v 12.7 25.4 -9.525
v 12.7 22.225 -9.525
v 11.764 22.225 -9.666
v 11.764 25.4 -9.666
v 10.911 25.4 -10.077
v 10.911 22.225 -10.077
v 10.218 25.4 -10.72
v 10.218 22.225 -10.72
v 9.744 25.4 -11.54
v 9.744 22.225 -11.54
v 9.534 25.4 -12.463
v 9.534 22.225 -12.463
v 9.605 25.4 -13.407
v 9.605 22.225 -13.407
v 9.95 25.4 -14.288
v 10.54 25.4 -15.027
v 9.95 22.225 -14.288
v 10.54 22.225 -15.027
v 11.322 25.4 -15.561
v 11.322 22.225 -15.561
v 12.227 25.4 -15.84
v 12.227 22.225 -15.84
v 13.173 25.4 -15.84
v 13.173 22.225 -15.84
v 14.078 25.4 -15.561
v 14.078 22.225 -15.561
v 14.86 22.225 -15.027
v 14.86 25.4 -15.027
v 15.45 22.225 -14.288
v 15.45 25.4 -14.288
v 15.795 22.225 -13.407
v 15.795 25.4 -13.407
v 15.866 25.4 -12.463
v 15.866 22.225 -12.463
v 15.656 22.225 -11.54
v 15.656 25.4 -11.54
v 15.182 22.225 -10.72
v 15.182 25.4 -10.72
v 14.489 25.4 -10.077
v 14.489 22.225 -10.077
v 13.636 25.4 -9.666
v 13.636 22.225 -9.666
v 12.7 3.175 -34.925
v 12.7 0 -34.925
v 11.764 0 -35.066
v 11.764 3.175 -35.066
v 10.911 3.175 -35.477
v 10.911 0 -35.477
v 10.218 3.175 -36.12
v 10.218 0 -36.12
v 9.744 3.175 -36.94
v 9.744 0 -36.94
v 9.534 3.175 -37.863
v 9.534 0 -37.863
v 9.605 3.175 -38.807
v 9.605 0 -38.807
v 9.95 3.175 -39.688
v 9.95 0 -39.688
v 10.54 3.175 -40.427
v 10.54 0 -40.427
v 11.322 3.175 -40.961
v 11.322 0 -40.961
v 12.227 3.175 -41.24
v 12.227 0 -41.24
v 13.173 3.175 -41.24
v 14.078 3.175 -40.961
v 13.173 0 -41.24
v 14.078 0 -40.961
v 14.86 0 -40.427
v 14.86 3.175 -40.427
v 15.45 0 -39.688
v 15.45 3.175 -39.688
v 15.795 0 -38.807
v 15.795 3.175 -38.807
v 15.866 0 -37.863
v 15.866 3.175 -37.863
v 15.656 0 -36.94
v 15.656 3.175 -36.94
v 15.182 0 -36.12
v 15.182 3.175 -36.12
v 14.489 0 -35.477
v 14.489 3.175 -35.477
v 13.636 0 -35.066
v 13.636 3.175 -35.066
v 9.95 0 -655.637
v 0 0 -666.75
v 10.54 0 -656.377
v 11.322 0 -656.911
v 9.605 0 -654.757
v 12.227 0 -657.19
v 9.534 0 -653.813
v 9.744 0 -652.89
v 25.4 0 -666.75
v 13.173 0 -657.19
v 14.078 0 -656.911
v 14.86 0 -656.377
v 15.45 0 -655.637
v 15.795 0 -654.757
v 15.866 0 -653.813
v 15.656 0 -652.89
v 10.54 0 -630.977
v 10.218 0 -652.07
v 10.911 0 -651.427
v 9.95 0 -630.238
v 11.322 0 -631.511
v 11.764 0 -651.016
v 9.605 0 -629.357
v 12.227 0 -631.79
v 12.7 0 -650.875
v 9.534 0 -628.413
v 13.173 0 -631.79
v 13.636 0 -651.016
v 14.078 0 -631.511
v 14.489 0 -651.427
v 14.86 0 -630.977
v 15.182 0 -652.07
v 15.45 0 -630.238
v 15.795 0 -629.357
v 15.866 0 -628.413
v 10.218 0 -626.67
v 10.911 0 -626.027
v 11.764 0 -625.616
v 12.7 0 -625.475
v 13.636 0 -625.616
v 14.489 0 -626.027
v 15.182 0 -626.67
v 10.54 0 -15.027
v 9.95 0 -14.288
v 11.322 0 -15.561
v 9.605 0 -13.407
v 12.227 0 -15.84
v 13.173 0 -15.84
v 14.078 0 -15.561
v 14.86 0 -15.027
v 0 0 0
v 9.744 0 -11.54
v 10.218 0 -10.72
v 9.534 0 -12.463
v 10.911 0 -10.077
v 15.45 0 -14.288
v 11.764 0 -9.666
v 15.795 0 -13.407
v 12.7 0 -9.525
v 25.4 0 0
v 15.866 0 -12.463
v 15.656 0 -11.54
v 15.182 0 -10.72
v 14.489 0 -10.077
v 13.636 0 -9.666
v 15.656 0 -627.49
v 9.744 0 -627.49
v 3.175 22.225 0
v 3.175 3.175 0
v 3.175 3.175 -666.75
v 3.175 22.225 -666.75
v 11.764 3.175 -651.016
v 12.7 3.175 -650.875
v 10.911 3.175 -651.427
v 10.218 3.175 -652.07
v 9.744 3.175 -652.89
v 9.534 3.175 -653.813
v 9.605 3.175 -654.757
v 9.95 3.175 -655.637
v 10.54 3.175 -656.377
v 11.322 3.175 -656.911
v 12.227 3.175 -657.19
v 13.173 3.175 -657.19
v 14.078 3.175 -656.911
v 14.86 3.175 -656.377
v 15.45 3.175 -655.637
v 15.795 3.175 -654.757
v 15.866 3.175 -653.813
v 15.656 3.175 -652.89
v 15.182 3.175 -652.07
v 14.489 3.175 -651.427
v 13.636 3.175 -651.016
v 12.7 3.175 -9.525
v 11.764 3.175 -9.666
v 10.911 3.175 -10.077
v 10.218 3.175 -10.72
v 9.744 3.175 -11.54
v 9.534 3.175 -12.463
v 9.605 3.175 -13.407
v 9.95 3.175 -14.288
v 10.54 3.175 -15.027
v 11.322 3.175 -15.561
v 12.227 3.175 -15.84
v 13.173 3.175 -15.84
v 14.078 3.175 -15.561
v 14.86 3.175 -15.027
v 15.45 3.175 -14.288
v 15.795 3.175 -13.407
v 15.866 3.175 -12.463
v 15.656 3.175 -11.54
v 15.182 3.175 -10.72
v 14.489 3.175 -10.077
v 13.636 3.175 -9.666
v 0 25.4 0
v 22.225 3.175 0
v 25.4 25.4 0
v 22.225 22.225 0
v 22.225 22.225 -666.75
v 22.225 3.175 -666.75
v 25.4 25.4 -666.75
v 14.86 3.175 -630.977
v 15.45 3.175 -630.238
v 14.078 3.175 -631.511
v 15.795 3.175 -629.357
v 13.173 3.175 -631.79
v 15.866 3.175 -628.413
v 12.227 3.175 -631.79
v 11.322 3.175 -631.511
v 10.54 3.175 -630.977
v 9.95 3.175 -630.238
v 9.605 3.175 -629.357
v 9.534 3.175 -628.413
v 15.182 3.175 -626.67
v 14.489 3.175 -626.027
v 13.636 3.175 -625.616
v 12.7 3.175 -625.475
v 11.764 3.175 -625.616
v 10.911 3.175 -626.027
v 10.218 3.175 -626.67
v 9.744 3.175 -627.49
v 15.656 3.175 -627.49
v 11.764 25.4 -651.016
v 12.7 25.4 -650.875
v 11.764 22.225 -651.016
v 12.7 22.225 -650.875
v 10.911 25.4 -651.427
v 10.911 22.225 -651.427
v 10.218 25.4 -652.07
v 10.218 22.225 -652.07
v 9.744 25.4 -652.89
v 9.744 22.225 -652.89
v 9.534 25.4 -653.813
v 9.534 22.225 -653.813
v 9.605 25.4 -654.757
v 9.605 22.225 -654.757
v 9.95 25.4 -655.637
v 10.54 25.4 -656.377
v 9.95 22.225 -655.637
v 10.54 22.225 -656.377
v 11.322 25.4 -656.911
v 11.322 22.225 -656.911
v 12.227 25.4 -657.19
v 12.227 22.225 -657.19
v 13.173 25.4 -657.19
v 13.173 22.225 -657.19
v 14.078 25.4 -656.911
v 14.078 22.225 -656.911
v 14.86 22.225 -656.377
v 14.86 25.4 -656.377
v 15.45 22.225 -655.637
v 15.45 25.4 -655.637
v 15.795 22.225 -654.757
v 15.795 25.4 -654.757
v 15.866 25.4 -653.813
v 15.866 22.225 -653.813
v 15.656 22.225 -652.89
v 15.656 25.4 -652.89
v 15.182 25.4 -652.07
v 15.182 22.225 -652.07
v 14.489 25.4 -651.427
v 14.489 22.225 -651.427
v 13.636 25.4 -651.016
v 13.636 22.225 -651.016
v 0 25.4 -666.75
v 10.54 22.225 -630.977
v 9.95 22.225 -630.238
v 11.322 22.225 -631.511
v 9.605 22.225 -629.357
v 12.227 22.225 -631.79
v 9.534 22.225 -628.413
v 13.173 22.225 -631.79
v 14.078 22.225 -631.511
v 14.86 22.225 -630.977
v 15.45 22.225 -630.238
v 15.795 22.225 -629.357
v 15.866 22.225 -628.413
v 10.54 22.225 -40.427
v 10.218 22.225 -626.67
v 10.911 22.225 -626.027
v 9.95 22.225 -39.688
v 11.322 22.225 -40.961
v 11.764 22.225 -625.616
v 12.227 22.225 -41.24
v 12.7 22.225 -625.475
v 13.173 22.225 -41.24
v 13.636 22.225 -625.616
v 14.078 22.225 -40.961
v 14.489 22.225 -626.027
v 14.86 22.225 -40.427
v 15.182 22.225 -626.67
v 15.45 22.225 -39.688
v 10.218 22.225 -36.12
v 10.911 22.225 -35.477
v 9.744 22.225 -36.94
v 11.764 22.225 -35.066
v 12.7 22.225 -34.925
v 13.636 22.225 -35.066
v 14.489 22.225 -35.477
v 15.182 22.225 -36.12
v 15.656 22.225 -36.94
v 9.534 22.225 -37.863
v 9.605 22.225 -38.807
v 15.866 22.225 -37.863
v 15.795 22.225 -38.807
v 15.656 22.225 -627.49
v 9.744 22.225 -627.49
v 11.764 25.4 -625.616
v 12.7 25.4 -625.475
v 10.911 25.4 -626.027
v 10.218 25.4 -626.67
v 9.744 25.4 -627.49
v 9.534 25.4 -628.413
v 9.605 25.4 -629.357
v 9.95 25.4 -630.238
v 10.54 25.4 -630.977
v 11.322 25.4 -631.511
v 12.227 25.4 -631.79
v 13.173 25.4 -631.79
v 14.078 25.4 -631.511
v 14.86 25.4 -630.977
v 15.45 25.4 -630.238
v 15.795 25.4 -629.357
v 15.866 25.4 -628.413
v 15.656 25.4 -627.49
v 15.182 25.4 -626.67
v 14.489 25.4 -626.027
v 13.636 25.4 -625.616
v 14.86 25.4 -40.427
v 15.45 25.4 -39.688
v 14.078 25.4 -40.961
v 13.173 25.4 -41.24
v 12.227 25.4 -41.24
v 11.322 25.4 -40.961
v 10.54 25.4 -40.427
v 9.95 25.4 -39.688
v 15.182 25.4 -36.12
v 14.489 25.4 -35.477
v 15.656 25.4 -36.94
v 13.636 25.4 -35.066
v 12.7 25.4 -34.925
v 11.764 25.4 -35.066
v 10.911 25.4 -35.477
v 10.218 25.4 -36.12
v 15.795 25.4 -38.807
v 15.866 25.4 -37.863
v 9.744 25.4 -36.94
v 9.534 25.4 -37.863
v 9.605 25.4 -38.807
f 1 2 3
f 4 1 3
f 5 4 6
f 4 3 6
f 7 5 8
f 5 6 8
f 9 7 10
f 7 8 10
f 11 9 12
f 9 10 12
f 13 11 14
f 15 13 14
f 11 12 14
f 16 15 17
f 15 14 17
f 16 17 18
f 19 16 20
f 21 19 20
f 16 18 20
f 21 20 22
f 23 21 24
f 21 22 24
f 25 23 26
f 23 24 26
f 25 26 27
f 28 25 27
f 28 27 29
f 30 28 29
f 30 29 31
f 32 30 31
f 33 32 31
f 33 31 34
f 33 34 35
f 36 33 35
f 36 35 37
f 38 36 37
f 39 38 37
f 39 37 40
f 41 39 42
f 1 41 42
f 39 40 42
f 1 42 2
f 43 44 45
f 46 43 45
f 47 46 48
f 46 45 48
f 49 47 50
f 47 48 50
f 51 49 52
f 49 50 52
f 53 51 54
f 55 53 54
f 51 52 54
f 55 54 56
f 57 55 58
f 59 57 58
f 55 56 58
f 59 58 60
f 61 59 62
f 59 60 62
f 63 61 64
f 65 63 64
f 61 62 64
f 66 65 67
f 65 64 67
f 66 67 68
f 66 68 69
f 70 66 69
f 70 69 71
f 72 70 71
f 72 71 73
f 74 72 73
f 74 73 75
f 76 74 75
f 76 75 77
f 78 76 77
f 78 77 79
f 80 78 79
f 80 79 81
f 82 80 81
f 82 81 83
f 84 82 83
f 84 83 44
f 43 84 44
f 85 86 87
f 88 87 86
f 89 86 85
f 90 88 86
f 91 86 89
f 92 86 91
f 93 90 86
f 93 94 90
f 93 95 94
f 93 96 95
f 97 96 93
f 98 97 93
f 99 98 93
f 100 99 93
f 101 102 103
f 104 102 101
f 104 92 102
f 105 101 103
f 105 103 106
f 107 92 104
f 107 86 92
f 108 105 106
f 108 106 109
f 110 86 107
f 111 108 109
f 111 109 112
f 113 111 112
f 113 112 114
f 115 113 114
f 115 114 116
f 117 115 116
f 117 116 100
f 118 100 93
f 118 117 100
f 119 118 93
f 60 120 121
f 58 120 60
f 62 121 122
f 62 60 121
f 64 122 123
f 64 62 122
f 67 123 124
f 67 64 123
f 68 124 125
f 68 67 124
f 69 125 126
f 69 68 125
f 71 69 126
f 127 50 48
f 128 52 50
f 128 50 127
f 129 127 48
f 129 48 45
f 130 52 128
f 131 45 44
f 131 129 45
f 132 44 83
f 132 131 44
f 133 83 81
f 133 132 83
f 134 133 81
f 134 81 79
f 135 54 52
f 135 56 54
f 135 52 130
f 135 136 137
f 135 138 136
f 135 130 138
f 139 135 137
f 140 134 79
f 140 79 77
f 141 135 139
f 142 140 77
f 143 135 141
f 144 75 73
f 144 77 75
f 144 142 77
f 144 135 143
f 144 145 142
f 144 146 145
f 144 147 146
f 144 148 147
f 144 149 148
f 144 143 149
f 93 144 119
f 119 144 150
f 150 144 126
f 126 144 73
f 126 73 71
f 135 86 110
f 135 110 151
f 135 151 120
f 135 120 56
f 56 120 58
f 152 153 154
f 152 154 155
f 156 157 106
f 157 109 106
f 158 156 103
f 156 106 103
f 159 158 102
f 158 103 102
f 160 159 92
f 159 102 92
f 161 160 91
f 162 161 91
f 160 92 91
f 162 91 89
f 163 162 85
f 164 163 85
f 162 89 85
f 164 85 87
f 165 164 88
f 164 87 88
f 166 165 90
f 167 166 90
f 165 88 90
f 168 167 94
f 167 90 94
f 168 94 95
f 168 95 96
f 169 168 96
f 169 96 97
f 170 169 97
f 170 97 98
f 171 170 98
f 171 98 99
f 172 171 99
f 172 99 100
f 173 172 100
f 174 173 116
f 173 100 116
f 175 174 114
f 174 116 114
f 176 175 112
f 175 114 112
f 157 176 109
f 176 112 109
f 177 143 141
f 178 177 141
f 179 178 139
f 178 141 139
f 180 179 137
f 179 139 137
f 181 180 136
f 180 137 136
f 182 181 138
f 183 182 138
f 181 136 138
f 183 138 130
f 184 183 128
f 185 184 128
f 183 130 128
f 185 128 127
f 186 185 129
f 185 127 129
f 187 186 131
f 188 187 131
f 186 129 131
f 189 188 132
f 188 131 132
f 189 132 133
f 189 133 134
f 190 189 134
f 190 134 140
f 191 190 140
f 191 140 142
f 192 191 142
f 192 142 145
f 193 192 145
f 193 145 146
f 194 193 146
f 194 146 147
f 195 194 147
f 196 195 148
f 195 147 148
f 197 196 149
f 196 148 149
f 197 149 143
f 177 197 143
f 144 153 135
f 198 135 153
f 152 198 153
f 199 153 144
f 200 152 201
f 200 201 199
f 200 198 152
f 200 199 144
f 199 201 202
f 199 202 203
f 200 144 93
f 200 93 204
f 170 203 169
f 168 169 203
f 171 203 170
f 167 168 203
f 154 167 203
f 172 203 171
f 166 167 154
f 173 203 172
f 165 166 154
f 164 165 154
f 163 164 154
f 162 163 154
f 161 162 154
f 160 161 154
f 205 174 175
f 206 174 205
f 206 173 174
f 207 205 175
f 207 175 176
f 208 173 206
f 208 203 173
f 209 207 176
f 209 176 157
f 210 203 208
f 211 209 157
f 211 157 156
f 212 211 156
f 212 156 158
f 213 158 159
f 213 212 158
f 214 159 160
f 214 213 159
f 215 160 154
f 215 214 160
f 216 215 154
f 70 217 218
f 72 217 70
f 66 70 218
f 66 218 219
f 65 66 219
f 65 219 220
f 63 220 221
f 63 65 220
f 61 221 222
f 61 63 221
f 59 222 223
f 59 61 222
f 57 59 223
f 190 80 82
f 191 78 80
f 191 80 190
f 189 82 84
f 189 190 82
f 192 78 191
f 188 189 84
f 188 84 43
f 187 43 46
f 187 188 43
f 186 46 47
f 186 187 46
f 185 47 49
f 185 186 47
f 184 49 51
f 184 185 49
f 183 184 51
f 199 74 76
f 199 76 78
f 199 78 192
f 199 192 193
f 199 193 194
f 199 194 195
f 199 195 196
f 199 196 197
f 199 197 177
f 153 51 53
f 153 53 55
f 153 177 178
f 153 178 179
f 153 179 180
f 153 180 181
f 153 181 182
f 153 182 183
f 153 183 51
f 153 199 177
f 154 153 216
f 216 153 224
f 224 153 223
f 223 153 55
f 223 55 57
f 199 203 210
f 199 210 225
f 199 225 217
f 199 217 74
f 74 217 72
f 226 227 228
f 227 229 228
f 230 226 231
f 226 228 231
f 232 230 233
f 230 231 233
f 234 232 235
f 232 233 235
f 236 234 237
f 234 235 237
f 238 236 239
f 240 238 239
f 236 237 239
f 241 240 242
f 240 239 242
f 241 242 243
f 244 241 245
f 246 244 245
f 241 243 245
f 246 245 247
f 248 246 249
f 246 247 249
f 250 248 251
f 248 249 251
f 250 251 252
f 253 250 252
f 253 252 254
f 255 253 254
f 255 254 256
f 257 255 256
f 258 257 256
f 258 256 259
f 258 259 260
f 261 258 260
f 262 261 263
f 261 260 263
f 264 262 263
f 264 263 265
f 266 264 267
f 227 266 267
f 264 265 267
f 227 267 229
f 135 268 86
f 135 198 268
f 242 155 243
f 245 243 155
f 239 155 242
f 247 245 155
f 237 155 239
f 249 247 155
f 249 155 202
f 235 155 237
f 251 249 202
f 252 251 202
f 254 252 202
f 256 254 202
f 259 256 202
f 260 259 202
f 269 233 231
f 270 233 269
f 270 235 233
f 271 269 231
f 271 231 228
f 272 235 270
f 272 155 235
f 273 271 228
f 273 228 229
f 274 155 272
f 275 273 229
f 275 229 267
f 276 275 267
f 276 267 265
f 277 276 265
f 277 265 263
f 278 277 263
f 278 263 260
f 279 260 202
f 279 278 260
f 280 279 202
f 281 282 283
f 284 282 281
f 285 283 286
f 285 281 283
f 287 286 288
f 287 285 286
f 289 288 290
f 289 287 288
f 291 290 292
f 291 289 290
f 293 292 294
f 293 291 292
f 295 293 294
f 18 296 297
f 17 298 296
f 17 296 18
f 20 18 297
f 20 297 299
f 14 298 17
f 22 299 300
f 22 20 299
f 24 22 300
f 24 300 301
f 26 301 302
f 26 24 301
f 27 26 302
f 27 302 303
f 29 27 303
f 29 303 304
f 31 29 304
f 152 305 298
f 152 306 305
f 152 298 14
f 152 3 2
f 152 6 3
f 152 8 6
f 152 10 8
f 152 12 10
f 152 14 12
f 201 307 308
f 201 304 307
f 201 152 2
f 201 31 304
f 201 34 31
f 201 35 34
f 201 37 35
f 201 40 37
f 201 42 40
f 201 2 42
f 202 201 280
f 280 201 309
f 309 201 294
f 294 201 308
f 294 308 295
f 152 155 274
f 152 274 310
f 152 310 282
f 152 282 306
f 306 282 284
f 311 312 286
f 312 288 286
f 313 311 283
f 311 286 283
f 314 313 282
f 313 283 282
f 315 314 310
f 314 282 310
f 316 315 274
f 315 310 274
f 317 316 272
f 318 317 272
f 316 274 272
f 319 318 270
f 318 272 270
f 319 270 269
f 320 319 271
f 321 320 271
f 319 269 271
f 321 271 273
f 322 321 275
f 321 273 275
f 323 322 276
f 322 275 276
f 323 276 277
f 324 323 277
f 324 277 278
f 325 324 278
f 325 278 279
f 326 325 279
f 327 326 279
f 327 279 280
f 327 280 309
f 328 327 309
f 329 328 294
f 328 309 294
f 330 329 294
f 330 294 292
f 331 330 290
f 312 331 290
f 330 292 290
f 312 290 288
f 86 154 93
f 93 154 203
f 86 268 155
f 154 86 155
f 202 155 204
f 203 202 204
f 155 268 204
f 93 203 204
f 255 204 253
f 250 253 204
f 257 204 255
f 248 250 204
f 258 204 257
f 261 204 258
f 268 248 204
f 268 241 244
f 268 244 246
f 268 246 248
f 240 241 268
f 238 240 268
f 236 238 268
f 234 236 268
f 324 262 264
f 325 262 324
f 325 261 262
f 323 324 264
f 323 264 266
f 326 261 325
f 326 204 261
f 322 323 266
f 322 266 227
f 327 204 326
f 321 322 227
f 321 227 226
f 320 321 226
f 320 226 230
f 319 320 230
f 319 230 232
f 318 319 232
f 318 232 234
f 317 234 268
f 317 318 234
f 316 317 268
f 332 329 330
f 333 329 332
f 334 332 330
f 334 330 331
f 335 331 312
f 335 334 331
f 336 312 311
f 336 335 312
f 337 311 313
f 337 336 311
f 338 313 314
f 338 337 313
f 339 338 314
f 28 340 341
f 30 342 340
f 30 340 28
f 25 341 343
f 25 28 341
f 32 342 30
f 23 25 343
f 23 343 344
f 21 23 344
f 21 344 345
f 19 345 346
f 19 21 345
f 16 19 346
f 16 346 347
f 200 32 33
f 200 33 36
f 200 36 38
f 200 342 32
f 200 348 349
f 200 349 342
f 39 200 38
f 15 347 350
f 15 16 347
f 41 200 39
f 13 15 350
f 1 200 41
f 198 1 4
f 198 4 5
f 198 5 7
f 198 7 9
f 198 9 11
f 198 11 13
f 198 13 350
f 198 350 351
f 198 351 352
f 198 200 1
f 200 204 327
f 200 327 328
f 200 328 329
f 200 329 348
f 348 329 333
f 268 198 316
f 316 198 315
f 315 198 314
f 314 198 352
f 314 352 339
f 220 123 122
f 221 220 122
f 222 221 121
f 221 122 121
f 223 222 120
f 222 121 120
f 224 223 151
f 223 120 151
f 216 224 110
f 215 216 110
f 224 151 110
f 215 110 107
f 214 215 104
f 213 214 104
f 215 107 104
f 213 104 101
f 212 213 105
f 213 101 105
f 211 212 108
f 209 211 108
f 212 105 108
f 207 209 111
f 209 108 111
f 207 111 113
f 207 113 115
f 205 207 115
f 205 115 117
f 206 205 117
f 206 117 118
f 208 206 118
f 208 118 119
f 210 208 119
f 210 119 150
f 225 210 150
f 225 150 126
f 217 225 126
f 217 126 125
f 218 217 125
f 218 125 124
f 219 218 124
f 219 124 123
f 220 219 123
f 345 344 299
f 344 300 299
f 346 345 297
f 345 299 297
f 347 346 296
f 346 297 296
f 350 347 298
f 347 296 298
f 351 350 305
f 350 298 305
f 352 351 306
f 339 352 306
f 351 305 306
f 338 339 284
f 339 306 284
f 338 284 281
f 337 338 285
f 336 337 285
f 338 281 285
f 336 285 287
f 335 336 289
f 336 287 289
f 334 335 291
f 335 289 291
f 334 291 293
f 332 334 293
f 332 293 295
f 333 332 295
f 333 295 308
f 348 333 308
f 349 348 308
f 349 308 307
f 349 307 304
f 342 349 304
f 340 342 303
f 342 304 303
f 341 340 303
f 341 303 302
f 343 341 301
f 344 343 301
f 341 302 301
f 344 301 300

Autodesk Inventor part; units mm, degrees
ref_plane "YZ Plane" through (0, 0, 0) normal (1, 0, 0) x (0, 1, 0)
ref_plane "XZ Plane" through (0, 0, 0) normal (0, 1, 0) x (-1, 0, 0)
ref_plane "XY Plane" through (0, 0, 0) normal (0, 0, 1) x (1, 0, 0)
sketch "Sketch1" plane through (0, 0, 0) normal (0, 0, 1) x (1, 0, 0)
  line L0 (0, 0) -> (25.4, 0)
  line L1 (25.4, 0) -> (25.4, 25.4)
  line L2 (25.4, 25.4) -> (0, 25.4)
  line L3 (0, 25.4) -> (0, 0)
  line L4 (3.175, 22.225) -> (22.225, 22.225)
  line L5 (22.225, 22.225) -> (22.225, 3.175)
  line L6 (22.225, 3.175) -> (3.175, 3.175)
  line L7 (3.175, 3.175) -> (3.175, 22.225)
  dimension "d0" = 25.4
  dimension "d1" = 25.4
  dimension "d2" = 3.175
extrude "Extrusion1" add sketch "Sketch1" against normal blind 666.75
sketch "Sketch2" plane through (0, 25.4, 0) normal (0, 1, 0) x (1, 0, 0)
  line L0 (25.4, 666.75) -> (0, 666.75) projected
  line L1 (25.4, 0) -> (0, 0) projected
  point P0 (12.7, 12.7)
  point P1 (12.7, 38.1)
  point P2 (12.7, 654.05)
  point P3 (12.7, 628.65)
  dimension "d5" = 12.7
  dimension "d6" = 25.4
  dimension "d7" = 25.4
  dimension "d8" = 12.7
hole "Hole1" at (12.7, 25.4, -12.7) at (12.7, 25.4, -38.1) at (12.7, 25.4, -654.05) at (12.7, 25.4, -628.65) direction (0, -1, 0) diameter 6.35 depth 25.4 tip angle 118
properties part number "12 inch middle piece"
